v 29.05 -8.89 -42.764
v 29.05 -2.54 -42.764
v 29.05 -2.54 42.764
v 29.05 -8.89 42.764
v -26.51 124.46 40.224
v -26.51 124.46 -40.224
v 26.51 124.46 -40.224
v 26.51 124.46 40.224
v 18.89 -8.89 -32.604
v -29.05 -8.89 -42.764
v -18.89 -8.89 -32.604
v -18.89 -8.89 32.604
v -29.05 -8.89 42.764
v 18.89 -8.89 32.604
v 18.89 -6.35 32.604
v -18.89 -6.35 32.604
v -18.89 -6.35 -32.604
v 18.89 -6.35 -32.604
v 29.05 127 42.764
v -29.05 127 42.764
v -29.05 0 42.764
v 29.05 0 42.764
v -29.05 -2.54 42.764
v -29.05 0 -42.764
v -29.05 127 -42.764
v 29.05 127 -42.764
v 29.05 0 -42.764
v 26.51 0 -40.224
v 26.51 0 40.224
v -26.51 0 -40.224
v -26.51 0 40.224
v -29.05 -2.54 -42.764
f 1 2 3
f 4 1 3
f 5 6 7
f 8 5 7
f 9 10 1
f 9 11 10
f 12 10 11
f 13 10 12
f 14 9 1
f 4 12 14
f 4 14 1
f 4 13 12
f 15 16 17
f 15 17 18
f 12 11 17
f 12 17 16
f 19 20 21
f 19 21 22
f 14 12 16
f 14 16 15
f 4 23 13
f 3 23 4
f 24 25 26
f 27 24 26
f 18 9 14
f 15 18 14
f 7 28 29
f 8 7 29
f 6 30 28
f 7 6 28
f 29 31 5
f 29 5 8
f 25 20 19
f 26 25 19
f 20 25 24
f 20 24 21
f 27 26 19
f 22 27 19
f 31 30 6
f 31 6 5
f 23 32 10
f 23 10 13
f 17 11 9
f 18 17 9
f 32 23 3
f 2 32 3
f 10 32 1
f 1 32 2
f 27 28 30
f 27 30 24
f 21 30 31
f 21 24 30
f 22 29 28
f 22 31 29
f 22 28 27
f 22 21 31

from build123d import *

# Parameters (mm, degrees)
F0_W     = 58.100566268
F0_H     = 85.527934134
F1_DEPTH = 127
F2_T     = -2.54
F3_W     = 58.100566268
F3_H     = 85.527934134
F4_DEPTH = 6.35
F6_W     = 37.780566268
F6_H     = 65.207934134
F7_DEPTH = 2.54


with BuildPart() as f1:
    # F0 (on Front) → F1 (new body)
    with BuildSketch(Plane.XZ):
        Rectangle(F0_W, F0_H)
    extrude(amount=-F1_DEPTH)

    # F2
    f2_openings = [f1.faces().sort_by_distance(p)[0] for p in [
        (0, 0, 0),
    ]]
    offset(amount=F2_T, openings=f2_openings)


with BuildPart() as f4:
    # F3 (on Front) → F4 (new body)
    with BuildSketch(Plane.XZ):
        Rectangle(F3_W, F3_H)
    extrude(amount=F4_DEPTH)


with BuildPart() as f4_1:
    # F5: moved
    add(f4.part.moved(Location((0, -2.54, 0))))

    # F6 (on face) → F7 (cut)
    with BuildSketch(Plane.XZ.offset(8.89)):
        Rectangle(F6_W, F6_H)
    extrude(amount=-F7_DEPTH, mode=Mode.SUBTRACT)


solid = Compound([f1.part, f4_1.part])
